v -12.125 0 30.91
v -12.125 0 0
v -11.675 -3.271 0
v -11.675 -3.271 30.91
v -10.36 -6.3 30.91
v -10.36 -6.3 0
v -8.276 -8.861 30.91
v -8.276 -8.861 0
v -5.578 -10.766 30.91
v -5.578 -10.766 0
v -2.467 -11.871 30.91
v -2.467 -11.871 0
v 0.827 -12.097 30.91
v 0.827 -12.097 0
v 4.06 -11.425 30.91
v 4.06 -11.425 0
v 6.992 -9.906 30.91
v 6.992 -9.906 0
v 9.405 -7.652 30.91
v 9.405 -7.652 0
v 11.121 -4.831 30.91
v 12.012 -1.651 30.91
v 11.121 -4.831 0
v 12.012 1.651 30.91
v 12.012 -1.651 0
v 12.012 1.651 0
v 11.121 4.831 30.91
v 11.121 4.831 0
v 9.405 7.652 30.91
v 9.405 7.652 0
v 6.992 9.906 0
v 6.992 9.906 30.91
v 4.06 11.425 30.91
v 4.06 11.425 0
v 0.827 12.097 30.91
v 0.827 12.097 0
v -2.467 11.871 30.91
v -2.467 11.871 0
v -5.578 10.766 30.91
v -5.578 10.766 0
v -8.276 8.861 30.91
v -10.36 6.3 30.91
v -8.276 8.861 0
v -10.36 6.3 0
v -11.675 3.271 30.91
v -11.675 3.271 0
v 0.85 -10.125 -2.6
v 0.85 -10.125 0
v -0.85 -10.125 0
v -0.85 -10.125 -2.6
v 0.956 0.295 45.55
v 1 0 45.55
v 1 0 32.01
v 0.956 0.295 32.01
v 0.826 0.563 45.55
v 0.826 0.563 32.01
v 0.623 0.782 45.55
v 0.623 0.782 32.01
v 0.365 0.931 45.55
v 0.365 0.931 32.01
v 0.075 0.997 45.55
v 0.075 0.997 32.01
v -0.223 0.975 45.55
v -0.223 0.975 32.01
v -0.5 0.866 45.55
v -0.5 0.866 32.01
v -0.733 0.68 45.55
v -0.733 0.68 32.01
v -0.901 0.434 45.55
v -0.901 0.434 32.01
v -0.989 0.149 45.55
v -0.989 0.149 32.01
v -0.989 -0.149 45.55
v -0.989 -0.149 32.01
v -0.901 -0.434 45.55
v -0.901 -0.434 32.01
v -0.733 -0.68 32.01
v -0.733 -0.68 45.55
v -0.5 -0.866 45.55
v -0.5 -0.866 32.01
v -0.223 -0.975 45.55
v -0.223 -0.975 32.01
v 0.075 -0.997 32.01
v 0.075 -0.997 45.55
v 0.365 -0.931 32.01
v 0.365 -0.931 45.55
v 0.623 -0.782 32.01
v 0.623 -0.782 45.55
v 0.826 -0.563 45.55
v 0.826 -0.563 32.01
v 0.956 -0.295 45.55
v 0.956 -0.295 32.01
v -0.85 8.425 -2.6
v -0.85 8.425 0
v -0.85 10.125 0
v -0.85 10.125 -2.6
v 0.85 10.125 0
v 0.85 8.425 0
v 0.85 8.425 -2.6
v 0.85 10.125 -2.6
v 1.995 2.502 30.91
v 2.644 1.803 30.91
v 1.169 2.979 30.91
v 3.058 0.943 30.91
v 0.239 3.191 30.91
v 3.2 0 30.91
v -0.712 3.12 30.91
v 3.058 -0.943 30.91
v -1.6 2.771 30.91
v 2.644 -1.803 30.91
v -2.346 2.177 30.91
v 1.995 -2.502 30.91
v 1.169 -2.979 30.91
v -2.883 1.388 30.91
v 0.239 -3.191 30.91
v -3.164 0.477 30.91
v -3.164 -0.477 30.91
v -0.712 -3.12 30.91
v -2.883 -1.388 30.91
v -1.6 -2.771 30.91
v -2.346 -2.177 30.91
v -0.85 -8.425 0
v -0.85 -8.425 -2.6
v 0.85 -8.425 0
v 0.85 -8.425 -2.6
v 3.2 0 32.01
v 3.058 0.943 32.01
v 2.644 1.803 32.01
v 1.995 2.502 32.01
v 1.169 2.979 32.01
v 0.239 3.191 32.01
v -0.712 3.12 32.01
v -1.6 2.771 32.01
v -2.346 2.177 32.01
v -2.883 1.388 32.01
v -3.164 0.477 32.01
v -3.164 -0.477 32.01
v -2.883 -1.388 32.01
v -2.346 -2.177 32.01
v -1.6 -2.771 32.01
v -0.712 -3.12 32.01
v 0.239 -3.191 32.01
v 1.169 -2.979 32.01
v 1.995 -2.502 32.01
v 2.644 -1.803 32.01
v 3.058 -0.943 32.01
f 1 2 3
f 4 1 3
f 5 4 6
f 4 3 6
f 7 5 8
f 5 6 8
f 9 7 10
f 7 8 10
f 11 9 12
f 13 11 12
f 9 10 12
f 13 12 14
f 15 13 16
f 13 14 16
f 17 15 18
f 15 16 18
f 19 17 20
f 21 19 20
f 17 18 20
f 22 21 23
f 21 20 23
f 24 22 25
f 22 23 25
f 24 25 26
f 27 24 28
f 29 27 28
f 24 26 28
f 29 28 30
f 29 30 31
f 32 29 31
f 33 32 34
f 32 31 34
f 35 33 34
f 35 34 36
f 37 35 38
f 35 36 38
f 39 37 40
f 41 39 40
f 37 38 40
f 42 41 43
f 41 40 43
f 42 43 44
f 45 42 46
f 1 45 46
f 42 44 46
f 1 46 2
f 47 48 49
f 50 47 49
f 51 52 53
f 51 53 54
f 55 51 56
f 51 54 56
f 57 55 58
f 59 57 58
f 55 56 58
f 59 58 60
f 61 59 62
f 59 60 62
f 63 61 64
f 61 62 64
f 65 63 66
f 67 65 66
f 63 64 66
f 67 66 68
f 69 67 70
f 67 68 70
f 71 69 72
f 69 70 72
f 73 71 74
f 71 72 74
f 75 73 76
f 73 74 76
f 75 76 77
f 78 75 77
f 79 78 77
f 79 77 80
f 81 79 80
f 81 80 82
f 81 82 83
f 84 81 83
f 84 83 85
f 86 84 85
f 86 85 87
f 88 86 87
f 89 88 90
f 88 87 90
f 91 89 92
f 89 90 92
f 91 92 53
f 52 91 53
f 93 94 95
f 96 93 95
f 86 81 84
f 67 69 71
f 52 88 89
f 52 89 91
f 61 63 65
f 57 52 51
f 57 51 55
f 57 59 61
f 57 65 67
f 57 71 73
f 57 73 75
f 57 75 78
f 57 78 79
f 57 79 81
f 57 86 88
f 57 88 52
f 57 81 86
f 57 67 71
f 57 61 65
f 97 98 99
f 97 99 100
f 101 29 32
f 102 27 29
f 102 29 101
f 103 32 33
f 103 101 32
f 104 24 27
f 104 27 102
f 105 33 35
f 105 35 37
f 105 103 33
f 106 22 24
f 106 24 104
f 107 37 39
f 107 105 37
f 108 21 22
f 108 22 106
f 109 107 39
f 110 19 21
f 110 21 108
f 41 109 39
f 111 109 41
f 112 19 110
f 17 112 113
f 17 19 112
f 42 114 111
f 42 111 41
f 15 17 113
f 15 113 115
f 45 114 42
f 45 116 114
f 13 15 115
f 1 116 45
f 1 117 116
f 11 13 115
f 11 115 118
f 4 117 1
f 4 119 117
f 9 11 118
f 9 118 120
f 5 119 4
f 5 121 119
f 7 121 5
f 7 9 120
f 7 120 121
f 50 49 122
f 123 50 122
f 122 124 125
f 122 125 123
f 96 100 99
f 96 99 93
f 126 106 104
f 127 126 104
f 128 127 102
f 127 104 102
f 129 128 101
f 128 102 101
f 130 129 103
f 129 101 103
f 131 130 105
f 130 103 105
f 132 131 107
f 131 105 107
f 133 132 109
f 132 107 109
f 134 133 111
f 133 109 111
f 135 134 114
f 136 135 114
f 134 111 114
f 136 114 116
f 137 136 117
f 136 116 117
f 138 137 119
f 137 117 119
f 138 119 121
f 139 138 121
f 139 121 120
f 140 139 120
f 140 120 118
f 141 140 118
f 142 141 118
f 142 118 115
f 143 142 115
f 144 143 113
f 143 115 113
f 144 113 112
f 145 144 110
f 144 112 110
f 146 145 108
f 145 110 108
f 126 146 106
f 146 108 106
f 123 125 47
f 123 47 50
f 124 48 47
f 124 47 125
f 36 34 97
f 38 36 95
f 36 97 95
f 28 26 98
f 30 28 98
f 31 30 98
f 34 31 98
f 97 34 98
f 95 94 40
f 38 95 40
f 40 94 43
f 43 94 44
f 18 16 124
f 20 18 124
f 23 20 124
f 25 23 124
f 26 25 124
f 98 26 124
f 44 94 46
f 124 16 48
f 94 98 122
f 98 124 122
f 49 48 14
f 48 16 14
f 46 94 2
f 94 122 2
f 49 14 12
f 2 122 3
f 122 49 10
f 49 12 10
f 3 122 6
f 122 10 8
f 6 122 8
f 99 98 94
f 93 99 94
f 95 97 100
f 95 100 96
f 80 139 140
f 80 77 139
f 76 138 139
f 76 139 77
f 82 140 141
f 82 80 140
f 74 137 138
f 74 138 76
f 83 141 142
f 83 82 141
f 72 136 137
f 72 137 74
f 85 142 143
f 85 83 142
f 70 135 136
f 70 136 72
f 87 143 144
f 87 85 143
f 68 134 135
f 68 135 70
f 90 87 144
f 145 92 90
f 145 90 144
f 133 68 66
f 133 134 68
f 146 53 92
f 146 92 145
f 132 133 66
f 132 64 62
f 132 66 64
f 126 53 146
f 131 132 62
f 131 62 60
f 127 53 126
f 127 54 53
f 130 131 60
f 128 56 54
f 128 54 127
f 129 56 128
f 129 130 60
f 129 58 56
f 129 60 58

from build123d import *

# Parameters (mm, degrees)
ESQUISSE1_R        = 12.125
BOSS_EXTRU_1_DEPTH = 30.91
ESQUISSE2_R        = 3.2
BOSS_EXTRU_2_DEPTH = 1.1
ESQUISSE3_R        = 1
BOSS_EXTRU_3_DEPTH = 13.54
ESQUISSE9_W        = 1.7
ESQUISSE9_H        = 1.7
BOSS_EXTRU_6_DEPTH = 2.6


with BuildPart() as part:
    # Esquisse1 → Boss.-Extru.1 (new body)
    with BuildSketch(Plane.XY):
        with Locations(Location((0, 0, 0), (0, 0, 180))):
            Circle(ESQUISSE1_R)
    extrude(amount=BOSS_EXTRU_1_DEPTH)

    # Esquisse2 → Boss.-Extru.2 (add)
    with BuildSketch(Plane.XY.offset(30.91)):
        Circle(ESQUISSE2_R)
    extrude(amount=BOSS_EXTRU_2_DEPTH)

    # Esquisse3 → Boss.-Extru.3 (add)
    with BuildSketch(Plane.XY.offset(32.01)):
        Circle(ESQUISSE3_R)
    extrude(amount=BOSS_EXTRU_3_DEPTH)

    # Esquisse9 → Boss.-Extru.6 (add)
    with BuildSketch(Plane(origin=(0, 0, 0), x_dir=(-1, 0, 0), z_dir=(0, 0, -1))):
        with Locations((0, -9.275)):
            Rectangle(ESQUISSE9_W, ESQUISSE9_H)
        with Locations((0, 9.275)):
            Rectangle(ESQUISSE9_W, ESQUISSE9_H)
    extrude(amount=BOSS_EXTRU_6_DEPTH)


solid = part.part
